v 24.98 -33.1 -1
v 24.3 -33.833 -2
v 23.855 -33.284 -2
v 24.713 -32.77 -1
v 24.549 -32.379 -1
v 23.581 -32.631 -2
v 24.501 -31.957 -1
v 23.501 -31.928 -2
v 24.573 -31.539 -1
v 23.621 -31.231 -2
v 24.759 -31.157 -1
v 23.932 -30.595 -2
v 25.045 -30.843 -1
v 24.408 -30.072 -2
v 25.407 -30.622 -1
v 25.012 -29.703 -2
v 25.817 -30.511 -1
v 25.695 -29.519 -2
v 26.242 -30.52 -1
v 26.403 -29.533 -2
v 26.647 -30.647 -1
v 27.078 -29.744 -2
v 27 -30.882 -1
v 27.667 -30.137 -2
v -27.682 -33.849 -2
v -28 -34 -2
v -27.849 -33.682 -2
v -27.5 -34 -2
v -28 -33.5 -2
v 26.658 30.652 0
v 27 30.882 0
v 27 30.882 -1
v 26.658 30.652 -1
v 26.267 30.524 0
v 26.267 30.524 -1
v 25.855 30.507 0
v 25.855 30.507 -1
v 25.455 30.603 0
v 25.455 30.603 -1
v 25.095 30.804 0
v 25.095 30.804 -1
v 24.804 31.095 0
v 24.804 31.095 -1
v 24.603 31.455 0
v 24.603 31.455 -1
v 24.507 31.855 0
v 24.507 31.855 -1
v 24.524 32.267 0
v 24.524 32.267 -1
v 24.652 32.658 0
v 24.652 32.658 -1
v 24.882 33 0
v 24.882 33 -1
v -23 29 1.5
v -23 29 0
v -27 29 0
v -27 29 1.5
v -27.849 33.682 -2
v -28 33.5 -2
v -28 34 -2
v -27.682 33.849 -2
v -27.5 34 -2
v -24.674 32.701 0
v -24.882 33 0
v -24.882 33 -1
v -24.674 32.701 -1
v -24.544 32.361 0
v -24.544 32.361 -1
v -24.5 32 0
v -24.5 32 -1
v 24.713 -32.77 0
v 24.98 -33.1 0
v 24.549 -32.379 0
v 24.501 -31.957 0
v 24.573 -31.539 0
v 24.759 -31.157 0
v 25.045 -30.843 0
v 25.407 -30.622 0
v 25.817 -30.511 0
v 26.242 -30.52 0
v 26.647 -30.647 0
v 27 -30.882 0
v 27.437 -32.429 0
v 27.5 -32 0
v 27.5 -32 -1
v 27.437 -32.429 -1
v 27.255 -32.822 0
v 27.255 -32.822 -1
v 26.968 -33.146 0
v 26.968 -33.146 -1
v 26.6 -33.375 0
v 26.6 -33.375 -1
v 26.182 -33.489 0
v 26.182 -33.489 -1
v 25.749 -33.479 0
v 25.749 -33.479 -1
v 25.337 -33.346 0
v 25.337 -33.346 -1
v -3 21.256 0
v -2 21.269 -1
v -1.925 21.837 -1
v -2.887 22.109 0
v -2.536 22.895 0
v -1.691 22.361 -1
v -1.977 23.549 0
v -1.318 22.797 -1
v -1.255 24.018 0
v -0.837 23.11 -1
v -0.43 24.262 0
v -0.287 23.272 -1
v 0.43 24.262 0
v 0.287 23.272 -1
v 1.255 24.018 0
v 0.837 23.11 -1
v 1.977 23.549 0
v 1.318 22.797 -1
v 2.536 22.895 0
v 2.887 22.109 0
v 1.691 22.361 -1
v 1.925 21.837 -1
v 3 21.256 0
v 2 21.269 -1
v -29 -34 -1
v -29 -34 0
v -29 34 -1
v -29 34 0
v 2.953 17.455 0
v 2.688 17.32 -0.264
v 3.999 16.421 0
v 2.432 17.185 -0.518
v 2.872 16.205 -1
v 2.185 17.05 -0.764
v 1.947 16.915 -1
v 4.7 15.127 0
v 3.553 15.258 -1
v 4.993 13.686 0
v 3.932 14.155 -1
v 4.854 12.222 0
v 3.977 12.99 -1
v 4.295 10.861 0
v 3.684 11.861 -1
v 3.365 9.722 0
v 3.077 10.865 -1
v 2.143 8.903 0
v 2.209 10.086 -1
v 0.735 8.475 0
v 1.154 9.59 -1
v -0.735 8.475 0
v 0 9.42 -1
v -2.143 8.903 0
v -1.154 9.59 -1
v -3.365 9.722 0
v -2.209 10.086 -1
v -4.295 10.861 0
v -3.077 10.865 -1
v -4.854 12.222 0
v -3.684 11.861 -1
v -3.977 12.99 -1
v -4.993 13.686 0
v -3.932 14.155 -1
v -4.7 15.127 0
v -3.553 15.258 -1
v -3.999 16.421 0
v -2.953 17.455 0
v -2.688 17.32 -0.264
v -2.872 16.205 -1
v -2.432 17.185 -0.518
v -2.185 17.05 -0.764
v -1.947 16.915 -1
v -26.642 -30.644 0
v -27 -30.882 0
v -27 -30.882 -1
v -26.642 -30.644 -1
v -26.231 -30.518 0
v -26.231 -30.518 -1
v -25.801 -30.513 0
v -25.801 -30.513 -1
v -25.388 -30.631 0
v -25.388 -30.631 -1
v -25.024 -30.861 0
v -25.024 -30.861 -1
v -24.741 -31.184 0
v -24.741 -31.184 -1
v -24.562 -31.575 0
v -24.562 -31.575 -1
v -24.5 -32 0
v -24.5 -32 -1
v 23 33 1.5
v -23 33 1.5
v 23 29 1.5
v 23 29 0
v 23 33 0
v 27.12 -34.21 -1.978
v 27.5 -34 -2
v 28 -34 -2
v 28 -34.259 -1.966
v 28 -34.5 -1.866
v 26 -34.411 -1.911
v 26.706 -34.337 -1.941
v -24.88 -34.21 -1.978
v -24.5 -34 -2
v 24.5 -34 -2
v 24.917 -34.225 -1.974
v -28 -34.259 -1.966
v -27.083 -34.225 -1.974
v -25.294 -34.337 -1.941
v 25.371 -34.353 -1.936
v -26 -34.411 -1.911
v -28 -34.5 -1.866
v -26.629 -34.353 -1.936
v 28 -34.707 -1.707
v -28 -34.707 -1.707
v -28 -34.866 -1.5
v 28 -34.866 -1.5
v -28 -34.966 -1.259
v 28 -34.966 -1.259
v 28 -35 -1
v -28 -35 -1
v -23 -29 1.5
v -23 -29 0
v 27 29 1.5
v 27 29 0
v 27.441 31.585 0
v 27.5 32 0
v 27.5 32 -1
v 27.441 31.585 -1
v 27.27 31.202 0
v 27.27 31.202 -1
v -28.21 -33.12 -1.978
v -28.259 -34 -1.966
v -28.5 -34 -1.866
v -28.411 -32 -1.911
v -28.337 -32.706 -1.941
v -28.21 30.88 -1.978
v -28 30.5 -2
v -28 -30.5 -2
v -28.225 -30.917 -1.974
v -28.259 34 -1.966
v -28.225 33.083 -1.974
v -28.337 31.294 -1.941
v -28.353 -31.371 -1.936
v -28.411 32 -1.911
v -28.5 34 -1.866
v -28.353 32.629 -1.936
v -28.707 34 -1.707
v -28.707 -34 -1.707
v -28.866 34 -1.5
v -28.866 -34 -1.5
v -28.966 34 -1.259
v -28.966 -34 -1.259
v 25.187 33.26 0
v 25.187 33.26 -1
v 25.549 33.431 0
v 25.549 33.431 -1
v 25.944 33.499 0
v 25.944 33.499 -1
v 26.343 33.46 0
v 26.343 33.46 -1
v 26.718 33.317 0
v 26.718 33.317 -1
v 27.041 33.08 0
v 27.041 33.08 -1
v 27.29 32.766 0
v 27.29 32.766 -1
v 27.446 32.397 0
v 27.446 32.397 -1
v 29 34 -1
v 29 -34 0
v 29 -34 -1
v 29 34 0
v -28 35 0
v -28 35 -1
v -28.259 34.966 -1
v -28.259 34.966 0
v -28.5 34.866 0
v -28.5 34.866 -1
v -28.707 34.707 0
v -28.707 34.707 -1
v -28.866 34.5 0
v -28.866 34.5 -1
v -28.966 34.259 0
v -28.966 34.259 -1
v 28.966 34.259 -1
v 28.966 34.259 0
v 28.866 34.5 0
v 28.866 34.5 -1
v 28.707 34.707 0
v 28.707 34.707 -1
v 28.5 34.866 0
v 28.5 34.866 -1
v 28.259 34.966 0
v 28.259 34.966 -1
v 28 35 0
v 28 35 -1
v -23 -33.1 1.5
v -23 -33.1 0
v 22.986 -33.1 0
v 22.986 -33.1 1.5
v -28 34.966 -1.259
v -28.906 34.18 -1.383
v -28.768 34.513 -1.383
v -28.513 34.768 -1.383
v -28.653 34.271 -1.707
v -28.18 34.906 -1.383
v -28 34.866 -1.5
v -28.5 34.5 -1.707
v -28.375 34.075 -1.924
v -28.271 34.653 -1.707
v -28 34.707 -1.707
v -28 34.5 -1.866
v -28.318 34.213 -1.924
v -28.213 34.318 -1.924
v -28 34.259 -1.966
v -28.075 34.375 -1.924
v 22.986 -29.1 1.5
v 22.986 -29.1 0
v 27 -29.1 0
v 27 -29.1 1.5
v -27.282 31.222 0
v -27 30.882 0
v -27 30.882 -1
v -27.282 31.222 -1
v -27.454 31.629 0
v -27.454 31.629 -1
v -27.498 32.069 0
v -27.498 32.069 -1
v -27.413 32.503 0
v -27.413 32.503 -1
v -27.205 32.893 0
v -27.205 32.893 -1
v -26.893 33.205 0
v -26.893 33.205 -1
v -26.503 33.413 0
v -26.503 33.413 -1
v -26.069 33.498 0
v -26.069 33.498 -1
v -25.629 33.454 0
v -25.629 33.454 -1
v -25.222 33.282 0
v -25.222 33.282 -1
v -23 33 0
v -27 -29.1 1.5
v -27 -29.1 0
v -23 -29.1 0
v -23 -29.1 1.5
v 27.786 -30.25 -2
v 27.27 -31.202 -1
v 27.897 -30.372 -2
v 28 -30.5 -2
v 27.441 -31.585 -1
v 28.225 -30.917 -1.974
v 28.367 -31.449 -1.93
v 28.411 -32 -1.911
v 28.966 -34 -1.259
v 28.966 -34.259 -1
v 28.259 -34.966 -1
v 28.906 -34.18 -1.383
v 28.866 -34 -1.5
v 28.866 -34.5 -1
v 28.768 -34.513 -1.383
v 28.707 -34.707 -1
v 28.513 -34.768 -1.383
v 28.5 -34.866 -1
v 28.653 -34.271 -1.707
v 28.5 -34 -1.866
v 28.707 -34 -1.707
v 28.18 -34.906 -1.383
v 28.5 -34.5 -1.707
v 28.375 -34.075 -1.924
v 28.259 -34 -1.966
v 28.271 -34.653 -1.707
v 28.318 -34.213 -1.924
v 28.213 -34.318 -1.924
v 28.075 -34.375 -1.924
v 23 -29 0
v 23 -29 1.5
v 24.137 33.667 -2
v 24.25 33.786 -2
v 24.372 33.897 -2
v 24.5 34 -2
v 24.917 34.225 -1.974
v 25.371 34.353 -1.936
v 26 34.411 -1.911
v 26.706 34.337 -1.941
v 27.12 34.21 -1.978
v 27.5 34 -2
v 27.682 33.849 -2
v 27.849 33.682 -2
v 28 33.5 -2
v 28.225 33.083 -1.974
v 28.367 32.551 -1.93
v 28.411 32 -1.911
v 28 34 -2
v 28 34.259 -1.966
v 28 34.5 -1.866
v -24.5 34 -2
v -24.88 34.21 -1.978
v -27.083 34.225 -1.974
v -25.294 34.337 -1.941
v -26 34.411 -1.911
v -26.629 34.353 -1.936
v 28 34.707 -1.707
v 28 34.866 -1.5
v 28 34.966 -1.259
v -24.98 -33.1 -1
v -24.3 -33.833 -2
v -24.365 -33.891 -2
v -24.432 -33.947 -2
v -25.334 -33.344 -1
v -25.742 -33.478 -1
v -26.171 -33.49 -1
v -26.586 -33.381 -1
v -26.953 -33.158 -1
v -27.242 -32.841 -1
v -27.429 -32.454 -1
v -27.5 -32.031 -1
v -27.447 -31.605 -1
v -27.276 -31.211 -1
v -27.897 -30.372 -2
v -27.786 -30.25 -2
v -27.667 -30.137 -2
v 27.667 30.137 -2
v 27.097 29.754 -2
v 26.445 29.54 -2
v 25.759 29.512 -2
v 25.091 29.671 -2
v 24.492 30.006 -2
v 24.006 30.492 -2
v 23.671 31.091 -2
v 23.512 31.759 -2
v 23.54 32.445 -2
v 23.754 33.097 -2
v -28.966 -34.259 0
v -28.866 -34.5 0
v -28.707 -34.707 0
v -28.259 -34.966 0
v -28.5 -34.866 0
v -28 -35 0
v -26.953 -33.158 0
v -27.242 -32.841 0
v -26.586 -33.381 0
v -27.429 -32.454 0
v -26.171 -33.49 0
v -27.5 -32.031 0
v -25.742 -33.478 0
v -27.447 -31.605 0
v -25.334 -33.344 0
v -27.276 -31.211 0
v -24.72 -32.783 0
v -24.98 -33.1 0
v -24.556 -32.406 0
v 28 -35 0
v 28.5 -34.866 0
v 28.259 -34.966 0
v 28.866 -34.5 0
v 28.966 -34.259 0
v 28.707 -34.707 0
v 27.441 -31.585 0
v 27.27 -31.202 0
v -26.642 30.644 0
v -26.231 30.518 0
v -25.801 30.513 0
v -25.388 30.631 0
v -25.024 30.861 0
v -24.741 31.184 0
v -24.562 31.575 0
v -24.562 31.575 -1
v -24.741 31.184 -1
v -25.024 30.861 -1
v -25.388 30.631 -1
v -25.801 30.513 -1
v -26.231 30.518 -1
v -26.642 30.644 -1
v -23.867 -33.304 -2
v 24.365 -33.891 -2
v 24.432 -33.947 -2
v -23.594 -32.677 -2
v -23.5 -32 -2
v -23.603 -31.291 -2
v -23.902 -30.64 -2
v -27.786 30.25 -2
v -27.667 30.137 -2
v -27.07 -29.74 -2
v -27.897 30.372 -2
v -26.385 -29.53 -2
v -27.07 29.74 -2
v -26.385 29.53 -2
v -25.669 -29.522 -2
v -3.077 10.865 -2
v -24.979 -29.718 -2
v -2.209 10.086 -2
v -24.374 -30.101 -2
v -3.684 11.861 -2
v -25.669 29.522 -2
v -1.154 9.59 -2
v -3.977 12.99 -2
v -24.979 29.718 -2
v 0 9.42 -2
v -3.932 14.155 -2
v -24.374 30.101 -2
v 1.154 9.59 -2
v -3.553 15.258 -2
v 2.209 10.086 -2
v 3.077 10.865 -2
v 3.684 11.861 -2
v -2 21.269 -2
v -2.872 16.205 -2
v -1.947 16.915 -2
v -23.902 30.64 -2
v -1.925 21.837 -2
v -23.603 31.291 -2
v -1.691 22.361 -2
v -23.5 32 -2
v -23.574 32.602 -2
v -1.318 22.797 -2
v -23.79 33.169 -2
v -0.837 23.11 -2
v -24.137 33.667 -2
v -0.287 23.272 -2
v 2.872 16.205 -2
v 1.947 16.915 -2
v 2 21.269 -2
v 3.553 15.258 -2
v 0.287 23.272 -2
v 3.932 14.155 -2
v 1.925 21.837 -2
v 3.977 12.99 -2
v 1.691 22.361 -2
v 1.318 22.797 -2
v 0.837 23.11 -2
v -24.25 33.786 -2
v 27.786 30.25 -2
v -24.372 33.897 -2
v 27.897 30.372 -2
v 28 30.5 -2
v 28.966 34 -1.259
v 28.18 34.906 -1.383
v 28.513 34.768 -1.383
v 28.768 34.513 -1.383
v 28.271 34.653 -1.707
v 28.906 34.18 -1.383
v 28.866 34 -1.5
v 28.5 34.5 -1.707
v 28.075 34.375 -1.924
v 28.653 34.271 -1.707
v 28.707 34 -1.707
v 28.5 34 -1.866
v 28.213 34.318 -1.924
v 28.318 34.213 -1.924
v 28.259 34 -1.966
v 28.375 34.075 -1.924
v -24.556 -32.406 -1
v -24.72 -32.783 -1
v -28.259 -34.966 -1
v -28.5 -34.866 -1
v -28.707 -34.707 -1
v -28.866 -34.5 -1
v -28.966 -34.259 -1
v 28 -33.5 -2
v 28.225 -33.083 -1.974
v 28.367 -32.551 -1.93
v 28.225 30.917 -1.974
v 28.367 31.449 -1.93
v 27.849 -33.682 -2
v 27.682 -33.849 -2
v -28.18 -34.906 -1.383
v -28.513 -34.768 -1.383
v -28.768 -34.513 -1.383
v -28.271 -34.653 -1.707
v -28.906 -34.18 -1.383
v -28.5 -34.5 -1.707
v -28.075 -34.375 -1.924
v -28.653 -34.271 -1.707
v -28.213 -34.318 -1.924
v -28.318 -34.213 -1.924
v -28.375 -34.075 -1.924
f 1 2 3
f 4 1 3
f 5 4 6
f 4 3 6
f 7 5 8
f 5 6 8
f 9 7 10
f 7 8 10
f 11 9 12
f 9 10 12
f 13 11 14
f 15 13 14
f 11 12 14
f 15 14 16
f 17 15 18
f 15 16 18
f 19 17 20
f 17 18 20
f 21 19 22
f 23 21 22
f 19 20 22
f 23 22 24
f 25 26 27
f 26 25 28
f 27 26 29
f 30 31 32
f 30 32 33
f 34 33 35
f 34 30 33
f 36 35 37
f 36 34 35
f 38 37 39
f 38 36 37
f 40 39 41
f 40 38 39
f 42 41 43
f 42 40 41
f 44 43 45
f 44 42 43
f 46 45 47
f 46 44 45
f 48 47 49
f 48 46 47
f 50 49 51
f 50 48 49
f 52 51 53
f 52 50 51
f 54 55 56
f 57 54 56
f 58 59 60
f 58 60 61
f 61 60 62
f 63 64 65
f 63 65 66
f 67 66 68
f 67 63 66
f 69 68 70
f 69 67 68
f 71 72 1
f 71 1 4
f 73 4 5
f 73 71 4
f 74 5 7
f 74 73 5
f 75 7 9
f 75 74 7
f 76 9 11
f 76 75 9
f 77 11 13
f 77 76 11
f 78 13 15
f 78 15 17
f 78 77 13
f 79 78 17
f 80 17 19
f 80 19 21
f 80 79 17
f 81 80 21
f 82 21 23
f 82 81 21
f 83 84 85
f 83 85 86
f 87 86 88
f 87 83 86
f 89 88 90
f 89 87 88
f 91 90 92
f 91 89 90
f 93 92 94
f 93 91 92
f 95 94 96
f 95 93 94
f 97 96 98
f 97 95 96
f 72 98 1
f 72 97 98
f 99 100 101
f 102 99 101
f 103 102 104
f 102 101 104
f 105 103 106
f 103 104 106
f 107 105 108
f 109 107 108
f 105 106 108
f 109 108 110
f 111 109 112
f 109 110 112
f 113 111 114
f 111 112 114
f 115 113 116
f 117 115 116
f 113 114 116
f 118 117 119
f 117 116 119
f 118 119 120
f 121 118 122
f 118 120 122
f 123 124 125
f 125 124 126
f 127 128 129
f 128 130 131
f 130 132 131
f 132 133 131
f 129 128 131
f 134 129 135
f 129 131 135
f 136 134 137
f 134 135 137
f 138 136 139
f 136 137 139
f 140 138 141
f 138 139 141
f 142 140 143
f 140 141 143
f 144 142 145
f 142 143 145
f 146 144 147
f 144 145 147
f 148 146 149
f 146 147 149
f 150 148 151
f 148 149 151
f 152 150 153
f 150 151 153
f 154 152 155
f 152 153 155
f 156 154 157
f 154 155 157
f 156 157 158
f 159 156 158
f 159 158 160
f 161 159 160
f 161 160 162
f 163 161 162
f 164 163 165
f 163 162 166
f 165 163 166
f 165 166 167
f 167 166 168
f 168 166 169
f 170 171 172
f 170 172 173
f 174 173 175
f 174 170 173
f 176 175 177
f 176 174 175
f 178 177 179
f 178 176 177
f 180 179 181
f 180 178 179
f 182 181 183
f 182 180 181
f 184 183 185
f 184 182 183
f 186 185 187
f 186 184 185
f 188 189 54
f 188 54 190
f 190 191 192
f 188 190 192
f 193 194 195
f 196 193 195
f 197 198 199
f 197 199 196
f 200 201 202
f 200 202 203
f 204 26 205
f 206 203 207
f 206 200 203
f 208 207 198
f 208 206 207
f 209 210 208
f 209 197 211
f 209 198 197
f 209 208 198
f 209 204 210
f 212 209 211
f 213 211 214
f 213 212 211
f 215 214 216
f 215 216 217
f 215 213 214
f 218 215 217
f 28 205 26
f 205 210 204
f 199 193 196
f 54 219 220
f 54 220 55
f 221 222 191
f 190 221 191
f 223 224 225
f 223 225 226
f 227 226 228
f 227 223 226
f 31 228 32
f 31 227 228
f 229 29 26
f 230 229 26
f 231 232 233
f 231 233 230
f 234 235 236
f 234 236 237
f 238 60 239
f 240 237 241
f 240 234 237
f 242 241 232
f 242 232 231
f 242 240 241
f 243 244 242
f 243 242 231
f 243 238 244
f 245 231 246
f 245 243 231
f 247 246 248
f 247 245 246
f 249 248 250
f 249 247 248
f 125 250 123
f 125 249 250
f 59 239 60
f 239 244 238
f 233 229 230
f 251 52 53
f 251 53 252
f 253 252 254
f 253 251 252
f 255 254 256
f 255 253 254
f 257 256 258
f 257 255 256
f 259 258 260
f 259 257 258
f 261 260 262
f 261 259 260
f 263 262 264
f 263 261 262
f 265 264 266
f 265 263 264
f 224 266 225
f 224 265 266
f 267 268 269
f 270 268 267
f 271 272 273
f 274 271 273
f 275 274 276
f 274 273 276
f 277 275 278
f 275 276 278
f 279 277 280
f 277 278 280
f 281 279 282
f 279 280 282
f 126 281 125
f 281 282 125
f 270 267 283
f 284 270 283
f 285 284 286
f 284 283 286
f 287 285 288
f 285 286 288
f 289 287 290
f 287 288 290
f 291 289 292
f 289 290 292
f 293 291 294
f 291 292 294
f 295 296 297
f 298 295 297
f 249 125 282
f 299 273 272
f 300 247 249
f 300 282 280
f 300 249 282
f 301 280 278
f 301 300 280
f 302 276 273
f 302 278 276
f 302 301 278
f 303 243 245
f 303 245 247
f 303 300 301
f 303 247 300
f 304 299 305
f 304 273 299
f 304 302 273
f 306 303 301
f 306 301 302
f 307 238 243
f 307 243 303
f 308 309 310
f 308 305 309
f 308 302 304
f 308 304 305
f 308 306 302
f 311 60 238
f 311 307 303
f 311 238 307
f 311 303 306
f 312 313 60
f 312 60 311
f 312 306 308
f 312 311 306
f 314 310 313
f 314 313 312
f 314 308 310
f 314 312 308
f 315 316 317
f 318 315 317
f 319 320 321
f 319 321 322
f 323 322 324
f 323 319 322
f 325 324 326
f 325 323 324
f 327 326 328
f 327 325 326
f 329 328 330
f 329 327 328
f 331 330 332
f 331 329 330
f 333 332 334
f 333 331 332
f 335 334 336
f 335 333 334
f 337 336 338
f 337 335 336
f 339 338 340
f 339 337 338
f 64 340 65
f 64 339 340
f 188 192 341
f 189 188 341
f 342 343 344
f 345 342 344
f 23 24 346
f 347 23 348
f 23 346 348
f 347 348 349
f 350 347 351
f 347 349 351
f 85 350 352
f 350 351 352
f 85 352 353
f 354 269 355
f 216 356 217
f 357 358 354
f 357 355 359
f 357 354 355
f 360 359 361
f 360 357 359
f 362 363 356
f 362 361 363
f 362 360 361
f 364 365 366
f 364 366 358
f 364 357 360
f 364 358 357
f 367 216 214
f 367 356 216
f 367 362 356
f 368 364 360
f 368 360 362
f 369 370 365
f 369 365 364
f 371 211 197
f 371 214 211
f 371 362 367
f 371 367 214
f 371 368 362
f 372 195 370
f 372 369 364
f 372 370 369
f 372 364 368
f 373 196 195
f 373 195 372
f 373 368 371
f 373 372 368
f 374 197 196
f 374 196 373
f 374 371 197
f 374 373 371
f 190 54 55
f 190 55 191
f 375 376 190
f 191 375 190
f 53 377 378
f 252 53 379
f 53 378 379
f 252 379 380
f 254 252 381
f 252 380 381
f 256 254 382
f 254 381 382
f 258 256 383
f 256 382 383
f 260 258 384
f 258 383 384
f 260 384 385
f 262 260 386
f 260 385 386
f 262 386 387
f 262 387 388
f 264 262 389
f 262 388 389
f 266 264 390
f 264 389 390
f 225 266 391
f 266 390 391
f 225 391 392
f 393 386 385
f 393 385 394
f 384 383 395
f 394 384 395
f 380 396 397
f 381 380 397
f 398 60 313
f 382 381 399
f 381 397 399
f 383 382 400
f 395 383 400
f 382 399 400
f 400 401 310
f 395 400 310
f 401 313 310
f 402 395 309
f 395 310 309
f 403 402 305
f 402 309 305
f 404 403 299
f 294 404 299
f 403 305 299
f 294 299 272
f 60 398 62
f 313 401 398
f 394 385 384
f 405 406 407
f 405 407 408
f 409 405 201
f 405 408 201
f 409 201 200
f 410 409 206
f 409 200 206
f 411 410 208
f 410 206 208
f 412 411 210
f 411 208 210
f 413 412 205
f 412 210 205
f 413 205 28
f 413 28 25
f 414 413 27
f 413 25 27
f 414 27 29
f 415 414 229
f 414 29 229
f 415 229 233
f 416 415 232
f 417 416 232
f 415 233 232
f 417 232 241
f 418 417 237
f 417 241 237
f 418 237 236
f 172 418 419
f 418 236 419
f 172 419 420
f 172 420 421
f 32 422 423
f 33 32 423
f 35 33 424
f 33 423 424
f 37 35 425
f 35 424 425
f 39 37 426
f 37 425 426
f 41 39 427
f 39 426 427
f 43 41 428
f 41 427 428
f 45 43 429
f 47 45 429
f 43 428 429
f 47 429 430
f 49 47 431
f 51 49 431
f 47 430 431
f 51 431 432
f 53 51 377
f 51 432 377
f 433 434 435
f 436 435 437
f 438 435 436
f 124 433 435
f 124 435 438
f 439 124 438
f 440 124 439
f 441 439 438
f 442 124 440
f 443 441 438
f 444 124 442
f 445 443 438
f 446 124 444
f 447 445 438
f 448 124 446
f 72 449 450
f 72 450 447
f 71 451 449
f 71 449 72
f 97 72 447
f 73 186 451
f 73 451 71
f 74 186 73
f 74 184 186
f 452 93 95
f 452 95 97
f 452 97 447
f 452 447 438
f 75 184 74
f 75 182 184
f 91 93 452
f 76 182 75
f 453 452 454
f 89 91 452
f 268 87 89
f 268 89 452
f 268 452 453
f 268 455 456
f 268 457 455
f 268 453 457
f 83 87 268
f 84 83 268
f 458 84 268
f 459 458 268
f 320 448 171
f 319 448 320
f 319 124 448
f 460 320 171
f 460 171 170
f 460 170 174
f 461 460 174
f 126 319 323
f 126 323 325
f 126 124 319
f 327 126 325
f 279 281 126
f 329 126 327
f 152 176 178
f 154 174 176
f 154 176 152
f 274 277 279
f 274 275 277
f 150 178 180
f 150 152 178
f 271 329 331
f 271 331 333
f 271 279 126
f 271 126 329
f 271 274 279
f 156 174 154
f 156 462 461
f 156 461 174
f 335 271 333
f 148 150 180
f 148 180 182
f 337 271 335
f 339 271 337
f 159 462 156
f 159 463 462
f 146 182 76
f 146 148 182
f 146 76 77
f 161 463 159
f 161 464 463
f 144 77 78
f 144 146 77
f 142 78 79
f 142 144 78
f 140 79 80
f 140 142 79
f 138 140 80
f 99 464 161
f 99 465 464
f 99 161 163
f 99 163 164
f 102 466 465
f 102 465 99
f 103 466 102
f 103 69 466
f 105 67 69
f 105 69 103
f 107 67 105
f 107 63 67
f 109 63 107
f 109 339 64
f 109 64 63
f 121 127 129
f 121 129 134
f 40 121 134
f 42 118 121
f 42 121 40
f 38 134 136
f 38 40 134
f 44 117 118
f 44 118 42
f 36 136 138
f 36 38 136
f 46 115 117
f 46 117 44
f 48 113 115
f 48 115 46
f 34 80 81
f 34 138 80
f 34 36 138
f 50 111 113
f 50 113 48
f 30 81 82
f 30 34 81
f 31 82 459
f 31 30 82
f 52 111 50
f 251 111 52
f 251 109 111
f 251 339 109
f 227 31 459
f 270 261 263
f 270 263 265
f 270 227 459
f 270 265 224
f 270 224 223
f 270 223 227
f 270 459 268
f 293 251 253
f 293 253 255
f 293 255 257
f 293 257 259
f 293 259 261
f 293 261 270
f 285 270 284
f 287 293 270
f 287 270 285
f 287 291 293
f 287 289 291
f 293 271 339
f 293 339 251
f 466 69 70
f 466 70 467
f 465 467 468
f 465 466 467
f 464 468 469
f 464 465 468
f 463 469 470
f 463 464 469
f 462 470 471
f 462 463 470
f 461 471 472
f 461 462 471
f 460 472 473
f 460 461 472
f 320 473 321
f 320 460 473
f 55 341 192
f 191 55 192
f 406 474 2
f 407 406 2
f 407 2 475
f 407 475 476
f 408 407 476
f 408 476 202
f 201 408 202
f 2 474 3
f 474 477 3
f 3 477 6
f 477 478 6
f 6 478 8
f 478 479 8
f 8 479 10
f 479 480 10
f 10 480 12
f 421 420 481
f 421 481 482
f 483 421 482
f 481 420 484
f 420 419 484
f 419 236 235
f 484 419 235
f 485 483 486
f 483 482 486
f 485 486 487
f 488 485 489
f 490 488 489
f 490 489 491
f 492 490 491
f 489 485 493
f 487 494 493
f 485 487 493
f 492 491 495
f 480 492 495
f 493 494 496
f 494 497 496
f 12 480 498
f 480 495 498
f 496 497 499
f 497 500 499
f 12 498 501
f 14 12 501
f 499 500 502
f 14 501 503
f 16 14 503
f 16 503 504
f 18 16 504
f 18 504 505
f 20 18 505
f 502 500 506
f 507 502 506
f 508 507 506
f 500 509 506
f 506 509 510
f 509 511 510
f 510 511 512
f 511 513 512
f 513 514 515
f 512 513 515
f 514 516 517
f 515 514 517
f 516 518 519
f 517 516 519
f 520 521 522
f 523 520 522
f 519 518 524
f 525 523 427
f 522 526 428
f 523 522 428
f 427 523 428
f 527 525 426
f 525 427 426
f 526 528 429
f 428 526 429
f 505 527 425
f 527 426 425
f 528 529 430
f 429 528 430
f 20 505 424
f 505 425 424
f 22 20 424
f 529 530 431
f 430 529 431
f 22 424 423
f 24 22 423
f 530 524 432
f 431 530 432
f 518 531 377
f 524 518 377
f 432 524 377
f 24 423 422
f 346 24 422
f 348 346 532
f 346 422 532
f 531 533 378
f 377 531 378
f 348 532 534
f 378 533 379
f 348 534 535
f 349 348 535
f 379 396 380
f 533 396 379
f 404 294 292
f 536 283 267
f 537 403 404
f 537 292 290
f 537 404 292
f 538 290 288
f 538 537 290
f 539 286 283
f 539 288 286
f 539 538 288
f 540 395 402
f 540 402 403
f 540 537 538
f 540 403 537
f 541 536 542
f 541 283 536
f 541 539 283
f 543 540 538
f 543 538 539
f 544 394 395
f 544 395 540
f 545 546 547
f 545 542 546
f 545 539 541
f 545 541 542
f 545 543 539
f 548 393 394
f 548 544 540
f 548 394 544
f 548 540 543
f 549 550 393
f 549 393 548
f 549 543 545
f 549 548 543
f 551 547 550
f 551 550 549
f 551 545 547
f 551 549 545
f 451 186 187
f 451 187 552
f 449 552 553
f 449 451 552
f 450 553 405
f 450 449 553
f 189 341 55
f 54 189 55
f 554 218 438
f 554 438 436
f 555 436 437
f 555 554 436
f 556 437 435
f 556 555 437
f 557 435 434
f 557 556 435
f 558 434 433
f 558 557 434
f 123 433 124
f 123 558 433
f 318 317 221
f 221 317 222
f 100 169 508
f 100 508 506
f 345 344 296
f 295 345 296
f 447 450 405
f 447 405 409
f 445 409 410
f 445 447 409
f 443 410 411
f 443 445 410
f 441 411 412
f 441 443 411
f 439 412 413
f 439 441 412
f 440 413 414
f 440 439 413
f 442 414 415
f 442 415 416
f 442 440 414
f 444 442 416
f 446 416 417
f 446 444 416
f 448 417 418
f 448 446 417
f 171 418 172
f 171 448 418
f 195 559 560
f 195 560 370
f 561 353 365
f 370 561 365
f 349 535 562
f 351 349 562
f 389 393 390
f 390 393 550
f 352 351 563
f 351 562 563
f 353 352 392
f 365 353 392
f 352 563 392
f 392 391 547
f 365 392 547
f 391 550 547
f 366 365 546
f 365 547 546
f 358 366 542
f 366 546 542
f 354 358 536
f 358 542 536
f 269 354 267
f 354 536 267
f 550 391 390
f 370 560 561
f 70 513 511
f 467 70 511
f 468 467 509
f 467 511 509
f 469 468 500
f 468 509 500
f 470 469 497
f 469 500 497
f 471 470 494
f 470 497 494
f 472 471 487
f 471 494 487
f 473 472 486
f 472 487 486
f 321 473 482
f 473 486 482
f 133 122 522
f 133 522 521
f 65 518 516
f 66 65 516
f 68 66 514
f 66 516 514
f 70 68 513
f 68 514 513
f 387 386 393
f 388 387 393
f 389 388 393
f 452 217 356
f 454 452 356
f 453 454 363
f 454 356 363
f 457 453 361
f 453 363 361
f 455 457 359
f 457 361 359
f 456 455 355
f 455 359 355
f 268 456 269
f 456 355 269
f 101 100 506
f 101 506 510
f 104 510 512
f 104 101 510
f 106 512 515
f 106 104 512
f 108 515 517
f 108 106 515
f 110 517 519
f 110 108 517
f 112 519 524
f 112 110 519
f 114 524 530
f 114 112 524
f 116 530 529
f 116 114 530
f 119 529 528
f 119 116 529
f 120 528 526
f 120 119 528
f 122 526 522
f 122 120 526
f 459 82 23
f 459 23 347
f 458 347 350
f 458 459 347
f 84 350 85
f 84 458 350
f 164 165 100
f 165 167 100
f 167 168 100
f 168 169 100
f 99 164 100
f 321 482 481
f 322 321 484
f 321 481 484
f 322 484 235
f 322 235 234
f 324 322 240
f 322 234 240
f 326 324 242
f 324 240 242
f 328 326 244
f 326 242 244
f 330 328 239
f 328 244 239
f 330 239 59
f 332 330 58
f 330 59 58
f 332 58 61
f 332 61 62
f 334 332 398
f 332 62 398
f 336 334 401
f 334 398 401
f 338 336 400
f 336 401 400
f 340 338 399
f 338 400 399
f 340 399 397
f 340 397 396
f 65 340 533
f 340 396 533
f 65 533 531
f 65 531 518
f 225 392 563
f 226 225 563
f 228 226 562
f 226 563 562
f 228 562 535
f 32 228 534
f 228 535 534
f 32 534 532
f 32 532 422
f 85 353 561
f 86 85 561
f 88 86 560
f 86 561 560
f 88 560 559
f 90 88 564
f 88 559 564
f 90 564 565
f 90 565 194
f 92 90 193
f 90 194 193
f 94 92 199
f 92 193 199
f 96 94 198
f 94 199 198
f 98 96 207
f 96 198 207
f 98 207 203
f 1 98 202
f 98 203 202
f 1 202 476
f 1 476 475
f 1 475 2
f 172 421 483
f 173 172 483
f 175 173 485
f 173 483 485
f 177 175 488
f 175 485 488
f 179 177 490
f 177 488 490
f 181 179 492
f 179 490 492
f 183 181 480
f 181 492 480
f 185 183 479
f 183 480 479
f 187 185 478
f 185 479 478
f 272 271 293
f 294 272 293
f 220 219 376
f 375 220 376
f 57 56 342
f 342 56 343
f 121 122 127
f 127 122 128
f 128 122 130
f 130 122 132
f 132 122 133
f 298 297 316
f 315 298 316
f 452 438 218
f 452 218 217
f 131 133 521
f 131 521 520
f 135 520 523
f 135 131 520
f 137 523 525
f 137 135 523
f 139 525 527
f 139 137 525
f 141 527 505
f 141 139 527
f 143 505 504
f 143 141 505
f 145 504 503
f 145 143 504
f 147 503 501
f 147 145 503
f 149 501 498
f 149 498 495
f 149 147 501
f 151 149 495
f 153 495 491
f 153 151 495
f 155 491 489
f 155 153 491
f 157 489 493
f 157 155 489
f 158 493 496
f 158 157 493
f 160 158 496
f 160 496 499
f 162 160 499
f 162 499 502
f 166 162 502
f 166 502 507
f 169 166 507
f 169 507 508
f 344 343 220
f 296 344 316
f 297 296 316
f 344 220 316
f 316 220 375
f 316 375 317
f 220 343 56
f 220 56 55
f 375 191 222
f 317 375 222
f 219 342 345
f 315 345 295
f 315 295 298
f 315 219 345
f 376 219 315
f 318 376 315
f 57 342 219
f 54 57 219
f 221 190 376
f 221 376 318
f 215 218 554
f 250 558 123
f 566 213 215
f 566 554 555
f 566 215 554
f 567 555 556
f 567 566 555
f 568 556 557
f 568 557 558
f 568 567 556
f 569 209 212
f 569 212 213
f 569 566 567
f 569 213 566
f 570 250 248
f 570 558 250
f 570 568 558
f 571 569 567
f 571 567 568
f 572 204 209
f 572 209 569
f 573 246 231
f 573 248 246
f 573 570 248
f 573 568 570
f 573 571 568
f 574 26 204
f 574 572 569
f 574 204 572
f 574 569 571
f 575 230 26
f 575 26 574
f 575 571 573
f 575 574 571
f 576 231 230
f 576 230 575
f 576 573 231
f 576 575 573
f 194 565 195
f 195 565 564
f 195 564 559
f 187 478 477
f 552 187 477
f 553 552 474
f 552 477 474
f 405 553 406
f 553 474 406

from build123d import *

# Parameters (mm, degrees)
F0_W         = 58
F0_H         = 70
F1_DEPTH     = 2
F2_DEPTH     = 1.5
F3_SIZE      = 1
F4_T1_DEPTH  = 56
F4_T3_DEPTH  = 68
F4_T5_DEPTH  = 3.5
F4_S9_W      = 1
F4_S9_H      = 1
F4_T10_DEPTH = 1
F4_S15_W     = 1
F4_S15_H     = 1
F4_T16_DEPTH = 1
F4_S21_W     = 1
F4_S21_H     = 1
F4_T22_DEPTH = 1
F4_S27_W     = 1
F4_S27_H     = 1
F4_T28_DEPTH = 1
F5_W         = 46
F5_H         = 58
F6_DEPTH     = 1.5
F7_SIZE      = 1


# Not quite as in the source:
# - a fillet or chamfer that OpenCascade refuses, or shapes differently, is made with other operations: its cross-section is extruded or revolved along the edge and cut away or added


with BuildPart() as f1:
    # F0 (on Top) → F1 (new body)
    with BuildSketch(Plane.XY):
        Rectangle(F0_W, F0_H)
        with BuildLine():
            Line((24.9801966052, -33.1000004709), (22.9855267704, -33.1000004709))
            Line((22.9855267704, -33.1000004709), (-23, -33.1000004709))
            Line((-23, -33.1000004709), (-24.9801966052, -33.1000004709))
            ThreePointArc((-24.9801966052, -33.1000004709), (-27.1090614319, -33.009941949), (-27, -30.8819660113))
            Line((-27, -30.8819660113), (-27, -29.1000004709))
            Line((-27, -29.1000004709), (-27, 29))
            Line((-27, 29), (-27, 30.8819660113))
            ThreePointArc((-27, 30.8819660113), (-27.0606601718, 33.0606601718), (-24.8819660113, 33))
            Line((-24.8819660113, 33), (-23, 33))
            Line((-23, 33), (23, 33))
            Line((23, 33), (24.8819660113, 33))
            ThreePointArc((24.8819660113, 33), (26.5352331347, 33.4012585384), (27.5, 32))
            ThreePointArc((27.5, 32), (27.3693063938, 31.3876275643), (27, 30.8819660113))
            Line((27, 30.8819660113), (27, 29))
            Line((27, 29), (27, -29.1000004709))
            Line((27, -29.1000004709), (27, -30.8819660113))
            ThreePointArc((27, -30.8819660113), (27.3693063938, -31.3876275643), (27.5, -32))
            ThreePointArc((27.5, -32), (26.6001228657, -33.374719079), (24.9801966052, -33.1000004709))
        make_face(mode=Mode.SUBTRACT)
        with BuildLine():
            Line((-24.9801966052, -33.1000004709), (-23, -33.1000004709))
            Line((-23, -33.1000004709), (-23, -29.1000004709))
            Line((-23, -29.1000004709), (-27, -29.1000004709))
            Line((-27, -29.1000004709), (-27, -30.8819660113))
            ThreePointArc((-27, -30.8819660113), (-25.3876275643, -30.6306936062), (-24.5, -32))
            ThreePointArc((-24.5, -32), (-24.625280921, -32.6001228657), (-24.9801966052, -33.1000004709))
        make_face()
        Polygon((-23, -33.1000004709), (22.9855267704, -33.1000004709), (22.9855267704, -29.1000004709), (27, -29.1000004709), (27, 29), (23, 29), (23, 33), (-23, 33), (-23, 29), (-27, 29), (-27, -29.1000004709), (-23, -29.1000004709), align=None)
        with BuildLine():
            ThreePointArc((1.9465169508, 16.914761033), (0, 9.4203266352), (-1.9465169508, 16.914761033))
            Line((-1.9465169508, 16.914761033), (-1.9998499612, 21.2685744208))
            ThreePointArc((-1.9998499612, 21.2685744208), (0, 23.2930720299), (1.9998499612, 21.2685744208))
            Line((1.9998499612, 21.2685744208), (1.9465169508, 16.914761033))
        make_face(mode=Mode.SUBTRACT)
        with BuildLine():
            Line((22.9855267704, -29.1000004709), (22.9855267704, -33.1000004709))
            Line((22.9855267704, -33.1000004709), (24.9801966052, -33.1000004709))
            ThreePointArc((24.9801966052, -33.1000004709), (24.8909385681, -30.990058051), (27, -30.8819660113))
            Line((27, -30.8819660113), (27, -29.1000004709))
            Line((27, -29.1000004709), (22.9855267704, -29.1000004709))
        make_face()
        with BuildLine():
            Line((-27, 30.8819660113), (-27, 29))
            Line((-27, 29), (-23, 29))
            Line((-23, 29), (-23, 33))
            Line((-23, 33), (-24.8819660113, 33))
            ThreePointArc((-24.8819660113, 33), (-24.5987414616, 32.5352331347), (-24.5, 32))
            ThreePointArc((-24.5, 32), (-25.3876275643, 30.6306936062), (-27, 30.8819660113))
        make_face()
        with BuildLine():
            Line((23, 29), (27, 29))
            Line((27, 29), (27, 30.8819660113))
            ThreePointArc((27, 30.8819660113), (24.9393398282, 30.9393398282), (24.8819660113, 33))
            Line((24.8819660113, 33), (23, 33))
            Line((23, 33), (23, 29))
        make_face()
    extrude(amount=-F1_DEPTH)

    # F3
    f3_edges = [f1.edges().sort_by_distance(p)[0] for p in [
        (25, 33.118034, -2),
        (-27.118034, 31, -2),
        (27.019803, -30.9, -2),
        (-25, -33.118034, -2),
    ]]
    chamfer(f3_edges, length=F3_SIZE)

    # F4: fillet of radius 1 on 8 edges, made by hand

    # F4_s2 → F4_t1 (cut)
    with BuildSketch(Plane.YZ.offset(-28)):
        with BuildLine():
            ThreePointArc((-34, -2), (-34.7071067812, -1.7071067812), (-35, -1))
            Line((-35, -1), (-35, -2))
            Line((-35, -2), (-34, -2))
        make_face()
        with BuildLine():
            ThreePointArc((34, -2), (34.7071067812, -1.7071067812), (35, -1))
            Line((35, -1), (35, -2))
            Line((35, -2), (34, -2))
        make_face()
    extrude(amount=F4_T1_DEPTH, mode=Mode.SUBTRACT)

    # F4_s4 → F4_t3 (cut)
    with BuildSketch(Plane.XZ.offset(-34)):
        with BuildLine():
            ThreePointArc((-28, -2), (-28.7071067812, -1.7071067812), (-29, -1))
            Line((-29, -1), (-29, -2))
            Line((-29, -2), (-28, -2))
        make_face()
        with BuildLine():
            ThreePointArc((28, -2), (28.7071067812, -1.7071067812), (29, -1))
            Line((29, -1), (29, -2))
            Line((29, -2), (28, -2))
        make_face()
    extrude(amount=F4_T3_DEPTH, mode=Mode.SUBTRACT)

    # F4_s6 → F4_t5 (cut)
    with BuildSketch(Plane.XY.offset(-1)):
        with BuildLine():
            ThreePointArc((-28, 35), (-28.7071067812, 34.7071067812), (-29, 34))
            Line((-29, 34), (-29, 35))
            Line((-29, 35), (-28, 35))
        make_face()
        with BuildLine():
            ThreePointArc((29, 34), (28.7071067812, 34.7071067812), (28, 35))
            Line((28, 35), (29, 35))
            Line((29, 35), (29, 34))
        make_face()
        with BuildLine():
            ThreePointArc((28, -35), (28.7071067812, -34.7071067812), (29, -34))
            Line((29, -34), (29, -35))
            Line((29, -35), (28, -35))
        make_face()
        with BuildLine():
            ThreePointArc((-28, -35), (-28.7071067812, -34.7071067812), (-29, -34))
            Line((-29, -34), (-29, -35))
            Line((-29, -35), (-28, -35))
        make_face()
    extrude(amount=F4_T5_DEPTH, mode=Mode.SUBTRACT)


with BuildPart() as f2:
    # F0 (on Top) → F2 (new body)
    with BuildSketch(Plane.XY):
        Polygon((-23, -33.1000004709), (22.9855267704, -33.1000004709), (22.9855267704, -29.1000004709), (27, -29.1000004709), (27, 29), (23, 29), (23, 33), (-23, 33), (-23, 29), (-27, 29), (-27, -29.1000004709), (-23, -29.1000004709), align=None)
        with BuildLine():
            ThreePointArc((1.9465169508, 16.914761033), (0, 9.4203266352), (-1.9465169508, 16.914761033))
            Line((-1.9465169508, 16.914761033), (-1.9998499612, 21.2685744208))
            ThreePointArc((-1.9998499612, 21.2685744208), (0, 23.2930720299), (1.9998499612, 21.2685744208))
            Line((1.9998499612, 21.2685744208), (1.9465169508, 16.914761033))
        make_face(mode=Mode.SUBTRACT)
    extrude(amount=F2_DEPTH)

    # F5 (on face) → F6 (cut)
    with BuildSketch(Plane.XY.offset(1.5)):
        Rectangle(F5_W, F5_H)
        with BuildLine():
            Line((1.9998499612, 21.2685744208), (1.9465169508, 16.914761033))
            ThreePointArc((1.9465169508, 16.914761033), (0, 9.4203266352), (-1.9465169508, 16.914761033))
            Line((-1.9465169508, 16.914761033), (-1.9998499612, 21.2685744208))
            ThreePointArc((-1.9998499612, 21.2685744208), (0, 23.2930720299), (1.9998499612, 21.2685744208))
        make_face(mode=Mode.SUBTRACT)
    extrude(amount=-F6_DEPTH, mode=Mode.SUBTRACT)


with BuildPart() as f4_tool8:
    # F4_s9 → F4_t10 (new body)
    with BuildSketch(Plane.XY.offset(-1)):
        with Locations((-28.5, -34.5)):
            Rectangle(F4_S9_W, F4_S9_H)
    extrude(amount=-F4_T10_DEPTH)

    # F4_s11 → F4_t12 (revolve, cut)
    with BuildSketch(Plane(origin=(-28, -34, -1), x_dir=(0.7071067812, 0.7071067812, 0), z_dir=(-0.7071067812, 0.7071067812, 0))):
        with BuildLine():
            ThreePointArc((0, -1), (1, 0), (0, 1))
            Line((0, 1), (0, -1))
        make_face()
    revolve(axis=Axis((-28, -34, -1), (0, 0, -1)), mode=Mode.SUBTRACT)


with BuildPart() as f1_1:
    add(f1.part)

    # F4_t7: cut F4_tool8
    add(f4_tool8.part, mode=Mode.SUBTRACT)


with BuildPart() as f4_tool14:
    # F4_s15 → F4_t16 (new body)
    with BuildSketch(Plane.XY.offset(-1)):
        with Locations((28.5, -34.5)):
            Rectangle(F4_S15_W, F4_S15_H)
    extrude(amount=-F4_T16_DEPTH)

    # F4_s17 → F4_t18 (revolve, cut)
    with BuildSketch(Plane(origin=(28, -34, -1), x_dir=(-0.7071067812, 0.7071067812, 0), z_dir=(-0.7071067812, -0.7071067812, 0))):
        with BuildLine():
            ThreePointArc((0, -1), (1, 0), (0, 1))
            Line((0, 1), (0, -1))
        make_face()
    revolve(axis=Axis((28, -34, -1), (0, 0, -1)), mode=Mode.SUBTRACT)


with BuildPart() as f1_2:
    add(f1_1.part)

    # F4_t13: cut F4_tool14
    add(f4_tool14.part, mode=Mode.SUBTRACT)


with BuildPart() as f4_tool20:
    # F4_s21 → F4_t22 (new body)
    with BuildSketch(Plane.XY.offset(-1)):
        with Locations((-28.5, 34.5)):
            Rectangle(F4_S21_W, F4_S21_H)
    extrude(amount=-F4_T22_DEPTH)

    # F4_s23 → F4_t24 (revolve, cut)
    with BuildSketch(Plane(origin=(-28, 34, -1), x_dir=(0.7071067812, -0.7071067812, 0), z_dir=(0.7071067812, 0.7071067812, 0))):
        with BuildLine():
            ThreePointArc((0, -1), (1, 0), (0, 1))
            Line((0, 1), (0, -1))
        make_face()
    revolve(axis=Axis((-28, 34, -1), (0, 0, -1)), mode=Mode.SUBTRACT)


with BuildPart() as f1_3:
    add(f1_2.part)

    # F4_t19: cut F4_tool20
    add(f4_tool20.part, mode=Mode.SUBTRACT)


with BuildPart() as f4_tool26:
    # F4_s27 → F4_t28 (new body)
    with BuildSketch(Plane.XY.offset(-1)):
        with Locations((28.5, 34.5)):
            Rectangle(F4_S27_W, F4_S27_H)
    extrude(amount=-F4_T28_DEPTH)

    # F4_s29 → F4_t30 (revolve, cut)
    with BuildSketch(Plane(origin=(28, 34, -1), x_dir=(-0.7071067812, -0.7071067812, 0), z_dir=(0.7071067812, -0.7071067812, 0))):
        with BuildLine():
            ThreePointArc((0, -1), (1, 0), (0, 1))
            Line((0, 1), (0, -1))
        make_face()
    revolve(axis=Axis((28, 34, -1), (0, 0, -1)), mode=Mode.SUBTRACT)


with BuildPart() as f1_4:
    add(f1_3.part)

    # F4_t25: cut F4_tool26
    add(f4_tool26.part, mode=Mode.SUBTRACT)

    # F7
    f7_edges = [f1_4.edges().sort_by_distance(p)[0] for p in [
        (0, 23.293072, 0),
        (-1.973183, 19.091668, 0),
        (0, 9.420327, 0),
        (1.973183, 19.091668, 0),
    ]]
    chamfer(f7_edges, length=F7_SIZE)


solid = Compound([f2.part, f1_4.part])
